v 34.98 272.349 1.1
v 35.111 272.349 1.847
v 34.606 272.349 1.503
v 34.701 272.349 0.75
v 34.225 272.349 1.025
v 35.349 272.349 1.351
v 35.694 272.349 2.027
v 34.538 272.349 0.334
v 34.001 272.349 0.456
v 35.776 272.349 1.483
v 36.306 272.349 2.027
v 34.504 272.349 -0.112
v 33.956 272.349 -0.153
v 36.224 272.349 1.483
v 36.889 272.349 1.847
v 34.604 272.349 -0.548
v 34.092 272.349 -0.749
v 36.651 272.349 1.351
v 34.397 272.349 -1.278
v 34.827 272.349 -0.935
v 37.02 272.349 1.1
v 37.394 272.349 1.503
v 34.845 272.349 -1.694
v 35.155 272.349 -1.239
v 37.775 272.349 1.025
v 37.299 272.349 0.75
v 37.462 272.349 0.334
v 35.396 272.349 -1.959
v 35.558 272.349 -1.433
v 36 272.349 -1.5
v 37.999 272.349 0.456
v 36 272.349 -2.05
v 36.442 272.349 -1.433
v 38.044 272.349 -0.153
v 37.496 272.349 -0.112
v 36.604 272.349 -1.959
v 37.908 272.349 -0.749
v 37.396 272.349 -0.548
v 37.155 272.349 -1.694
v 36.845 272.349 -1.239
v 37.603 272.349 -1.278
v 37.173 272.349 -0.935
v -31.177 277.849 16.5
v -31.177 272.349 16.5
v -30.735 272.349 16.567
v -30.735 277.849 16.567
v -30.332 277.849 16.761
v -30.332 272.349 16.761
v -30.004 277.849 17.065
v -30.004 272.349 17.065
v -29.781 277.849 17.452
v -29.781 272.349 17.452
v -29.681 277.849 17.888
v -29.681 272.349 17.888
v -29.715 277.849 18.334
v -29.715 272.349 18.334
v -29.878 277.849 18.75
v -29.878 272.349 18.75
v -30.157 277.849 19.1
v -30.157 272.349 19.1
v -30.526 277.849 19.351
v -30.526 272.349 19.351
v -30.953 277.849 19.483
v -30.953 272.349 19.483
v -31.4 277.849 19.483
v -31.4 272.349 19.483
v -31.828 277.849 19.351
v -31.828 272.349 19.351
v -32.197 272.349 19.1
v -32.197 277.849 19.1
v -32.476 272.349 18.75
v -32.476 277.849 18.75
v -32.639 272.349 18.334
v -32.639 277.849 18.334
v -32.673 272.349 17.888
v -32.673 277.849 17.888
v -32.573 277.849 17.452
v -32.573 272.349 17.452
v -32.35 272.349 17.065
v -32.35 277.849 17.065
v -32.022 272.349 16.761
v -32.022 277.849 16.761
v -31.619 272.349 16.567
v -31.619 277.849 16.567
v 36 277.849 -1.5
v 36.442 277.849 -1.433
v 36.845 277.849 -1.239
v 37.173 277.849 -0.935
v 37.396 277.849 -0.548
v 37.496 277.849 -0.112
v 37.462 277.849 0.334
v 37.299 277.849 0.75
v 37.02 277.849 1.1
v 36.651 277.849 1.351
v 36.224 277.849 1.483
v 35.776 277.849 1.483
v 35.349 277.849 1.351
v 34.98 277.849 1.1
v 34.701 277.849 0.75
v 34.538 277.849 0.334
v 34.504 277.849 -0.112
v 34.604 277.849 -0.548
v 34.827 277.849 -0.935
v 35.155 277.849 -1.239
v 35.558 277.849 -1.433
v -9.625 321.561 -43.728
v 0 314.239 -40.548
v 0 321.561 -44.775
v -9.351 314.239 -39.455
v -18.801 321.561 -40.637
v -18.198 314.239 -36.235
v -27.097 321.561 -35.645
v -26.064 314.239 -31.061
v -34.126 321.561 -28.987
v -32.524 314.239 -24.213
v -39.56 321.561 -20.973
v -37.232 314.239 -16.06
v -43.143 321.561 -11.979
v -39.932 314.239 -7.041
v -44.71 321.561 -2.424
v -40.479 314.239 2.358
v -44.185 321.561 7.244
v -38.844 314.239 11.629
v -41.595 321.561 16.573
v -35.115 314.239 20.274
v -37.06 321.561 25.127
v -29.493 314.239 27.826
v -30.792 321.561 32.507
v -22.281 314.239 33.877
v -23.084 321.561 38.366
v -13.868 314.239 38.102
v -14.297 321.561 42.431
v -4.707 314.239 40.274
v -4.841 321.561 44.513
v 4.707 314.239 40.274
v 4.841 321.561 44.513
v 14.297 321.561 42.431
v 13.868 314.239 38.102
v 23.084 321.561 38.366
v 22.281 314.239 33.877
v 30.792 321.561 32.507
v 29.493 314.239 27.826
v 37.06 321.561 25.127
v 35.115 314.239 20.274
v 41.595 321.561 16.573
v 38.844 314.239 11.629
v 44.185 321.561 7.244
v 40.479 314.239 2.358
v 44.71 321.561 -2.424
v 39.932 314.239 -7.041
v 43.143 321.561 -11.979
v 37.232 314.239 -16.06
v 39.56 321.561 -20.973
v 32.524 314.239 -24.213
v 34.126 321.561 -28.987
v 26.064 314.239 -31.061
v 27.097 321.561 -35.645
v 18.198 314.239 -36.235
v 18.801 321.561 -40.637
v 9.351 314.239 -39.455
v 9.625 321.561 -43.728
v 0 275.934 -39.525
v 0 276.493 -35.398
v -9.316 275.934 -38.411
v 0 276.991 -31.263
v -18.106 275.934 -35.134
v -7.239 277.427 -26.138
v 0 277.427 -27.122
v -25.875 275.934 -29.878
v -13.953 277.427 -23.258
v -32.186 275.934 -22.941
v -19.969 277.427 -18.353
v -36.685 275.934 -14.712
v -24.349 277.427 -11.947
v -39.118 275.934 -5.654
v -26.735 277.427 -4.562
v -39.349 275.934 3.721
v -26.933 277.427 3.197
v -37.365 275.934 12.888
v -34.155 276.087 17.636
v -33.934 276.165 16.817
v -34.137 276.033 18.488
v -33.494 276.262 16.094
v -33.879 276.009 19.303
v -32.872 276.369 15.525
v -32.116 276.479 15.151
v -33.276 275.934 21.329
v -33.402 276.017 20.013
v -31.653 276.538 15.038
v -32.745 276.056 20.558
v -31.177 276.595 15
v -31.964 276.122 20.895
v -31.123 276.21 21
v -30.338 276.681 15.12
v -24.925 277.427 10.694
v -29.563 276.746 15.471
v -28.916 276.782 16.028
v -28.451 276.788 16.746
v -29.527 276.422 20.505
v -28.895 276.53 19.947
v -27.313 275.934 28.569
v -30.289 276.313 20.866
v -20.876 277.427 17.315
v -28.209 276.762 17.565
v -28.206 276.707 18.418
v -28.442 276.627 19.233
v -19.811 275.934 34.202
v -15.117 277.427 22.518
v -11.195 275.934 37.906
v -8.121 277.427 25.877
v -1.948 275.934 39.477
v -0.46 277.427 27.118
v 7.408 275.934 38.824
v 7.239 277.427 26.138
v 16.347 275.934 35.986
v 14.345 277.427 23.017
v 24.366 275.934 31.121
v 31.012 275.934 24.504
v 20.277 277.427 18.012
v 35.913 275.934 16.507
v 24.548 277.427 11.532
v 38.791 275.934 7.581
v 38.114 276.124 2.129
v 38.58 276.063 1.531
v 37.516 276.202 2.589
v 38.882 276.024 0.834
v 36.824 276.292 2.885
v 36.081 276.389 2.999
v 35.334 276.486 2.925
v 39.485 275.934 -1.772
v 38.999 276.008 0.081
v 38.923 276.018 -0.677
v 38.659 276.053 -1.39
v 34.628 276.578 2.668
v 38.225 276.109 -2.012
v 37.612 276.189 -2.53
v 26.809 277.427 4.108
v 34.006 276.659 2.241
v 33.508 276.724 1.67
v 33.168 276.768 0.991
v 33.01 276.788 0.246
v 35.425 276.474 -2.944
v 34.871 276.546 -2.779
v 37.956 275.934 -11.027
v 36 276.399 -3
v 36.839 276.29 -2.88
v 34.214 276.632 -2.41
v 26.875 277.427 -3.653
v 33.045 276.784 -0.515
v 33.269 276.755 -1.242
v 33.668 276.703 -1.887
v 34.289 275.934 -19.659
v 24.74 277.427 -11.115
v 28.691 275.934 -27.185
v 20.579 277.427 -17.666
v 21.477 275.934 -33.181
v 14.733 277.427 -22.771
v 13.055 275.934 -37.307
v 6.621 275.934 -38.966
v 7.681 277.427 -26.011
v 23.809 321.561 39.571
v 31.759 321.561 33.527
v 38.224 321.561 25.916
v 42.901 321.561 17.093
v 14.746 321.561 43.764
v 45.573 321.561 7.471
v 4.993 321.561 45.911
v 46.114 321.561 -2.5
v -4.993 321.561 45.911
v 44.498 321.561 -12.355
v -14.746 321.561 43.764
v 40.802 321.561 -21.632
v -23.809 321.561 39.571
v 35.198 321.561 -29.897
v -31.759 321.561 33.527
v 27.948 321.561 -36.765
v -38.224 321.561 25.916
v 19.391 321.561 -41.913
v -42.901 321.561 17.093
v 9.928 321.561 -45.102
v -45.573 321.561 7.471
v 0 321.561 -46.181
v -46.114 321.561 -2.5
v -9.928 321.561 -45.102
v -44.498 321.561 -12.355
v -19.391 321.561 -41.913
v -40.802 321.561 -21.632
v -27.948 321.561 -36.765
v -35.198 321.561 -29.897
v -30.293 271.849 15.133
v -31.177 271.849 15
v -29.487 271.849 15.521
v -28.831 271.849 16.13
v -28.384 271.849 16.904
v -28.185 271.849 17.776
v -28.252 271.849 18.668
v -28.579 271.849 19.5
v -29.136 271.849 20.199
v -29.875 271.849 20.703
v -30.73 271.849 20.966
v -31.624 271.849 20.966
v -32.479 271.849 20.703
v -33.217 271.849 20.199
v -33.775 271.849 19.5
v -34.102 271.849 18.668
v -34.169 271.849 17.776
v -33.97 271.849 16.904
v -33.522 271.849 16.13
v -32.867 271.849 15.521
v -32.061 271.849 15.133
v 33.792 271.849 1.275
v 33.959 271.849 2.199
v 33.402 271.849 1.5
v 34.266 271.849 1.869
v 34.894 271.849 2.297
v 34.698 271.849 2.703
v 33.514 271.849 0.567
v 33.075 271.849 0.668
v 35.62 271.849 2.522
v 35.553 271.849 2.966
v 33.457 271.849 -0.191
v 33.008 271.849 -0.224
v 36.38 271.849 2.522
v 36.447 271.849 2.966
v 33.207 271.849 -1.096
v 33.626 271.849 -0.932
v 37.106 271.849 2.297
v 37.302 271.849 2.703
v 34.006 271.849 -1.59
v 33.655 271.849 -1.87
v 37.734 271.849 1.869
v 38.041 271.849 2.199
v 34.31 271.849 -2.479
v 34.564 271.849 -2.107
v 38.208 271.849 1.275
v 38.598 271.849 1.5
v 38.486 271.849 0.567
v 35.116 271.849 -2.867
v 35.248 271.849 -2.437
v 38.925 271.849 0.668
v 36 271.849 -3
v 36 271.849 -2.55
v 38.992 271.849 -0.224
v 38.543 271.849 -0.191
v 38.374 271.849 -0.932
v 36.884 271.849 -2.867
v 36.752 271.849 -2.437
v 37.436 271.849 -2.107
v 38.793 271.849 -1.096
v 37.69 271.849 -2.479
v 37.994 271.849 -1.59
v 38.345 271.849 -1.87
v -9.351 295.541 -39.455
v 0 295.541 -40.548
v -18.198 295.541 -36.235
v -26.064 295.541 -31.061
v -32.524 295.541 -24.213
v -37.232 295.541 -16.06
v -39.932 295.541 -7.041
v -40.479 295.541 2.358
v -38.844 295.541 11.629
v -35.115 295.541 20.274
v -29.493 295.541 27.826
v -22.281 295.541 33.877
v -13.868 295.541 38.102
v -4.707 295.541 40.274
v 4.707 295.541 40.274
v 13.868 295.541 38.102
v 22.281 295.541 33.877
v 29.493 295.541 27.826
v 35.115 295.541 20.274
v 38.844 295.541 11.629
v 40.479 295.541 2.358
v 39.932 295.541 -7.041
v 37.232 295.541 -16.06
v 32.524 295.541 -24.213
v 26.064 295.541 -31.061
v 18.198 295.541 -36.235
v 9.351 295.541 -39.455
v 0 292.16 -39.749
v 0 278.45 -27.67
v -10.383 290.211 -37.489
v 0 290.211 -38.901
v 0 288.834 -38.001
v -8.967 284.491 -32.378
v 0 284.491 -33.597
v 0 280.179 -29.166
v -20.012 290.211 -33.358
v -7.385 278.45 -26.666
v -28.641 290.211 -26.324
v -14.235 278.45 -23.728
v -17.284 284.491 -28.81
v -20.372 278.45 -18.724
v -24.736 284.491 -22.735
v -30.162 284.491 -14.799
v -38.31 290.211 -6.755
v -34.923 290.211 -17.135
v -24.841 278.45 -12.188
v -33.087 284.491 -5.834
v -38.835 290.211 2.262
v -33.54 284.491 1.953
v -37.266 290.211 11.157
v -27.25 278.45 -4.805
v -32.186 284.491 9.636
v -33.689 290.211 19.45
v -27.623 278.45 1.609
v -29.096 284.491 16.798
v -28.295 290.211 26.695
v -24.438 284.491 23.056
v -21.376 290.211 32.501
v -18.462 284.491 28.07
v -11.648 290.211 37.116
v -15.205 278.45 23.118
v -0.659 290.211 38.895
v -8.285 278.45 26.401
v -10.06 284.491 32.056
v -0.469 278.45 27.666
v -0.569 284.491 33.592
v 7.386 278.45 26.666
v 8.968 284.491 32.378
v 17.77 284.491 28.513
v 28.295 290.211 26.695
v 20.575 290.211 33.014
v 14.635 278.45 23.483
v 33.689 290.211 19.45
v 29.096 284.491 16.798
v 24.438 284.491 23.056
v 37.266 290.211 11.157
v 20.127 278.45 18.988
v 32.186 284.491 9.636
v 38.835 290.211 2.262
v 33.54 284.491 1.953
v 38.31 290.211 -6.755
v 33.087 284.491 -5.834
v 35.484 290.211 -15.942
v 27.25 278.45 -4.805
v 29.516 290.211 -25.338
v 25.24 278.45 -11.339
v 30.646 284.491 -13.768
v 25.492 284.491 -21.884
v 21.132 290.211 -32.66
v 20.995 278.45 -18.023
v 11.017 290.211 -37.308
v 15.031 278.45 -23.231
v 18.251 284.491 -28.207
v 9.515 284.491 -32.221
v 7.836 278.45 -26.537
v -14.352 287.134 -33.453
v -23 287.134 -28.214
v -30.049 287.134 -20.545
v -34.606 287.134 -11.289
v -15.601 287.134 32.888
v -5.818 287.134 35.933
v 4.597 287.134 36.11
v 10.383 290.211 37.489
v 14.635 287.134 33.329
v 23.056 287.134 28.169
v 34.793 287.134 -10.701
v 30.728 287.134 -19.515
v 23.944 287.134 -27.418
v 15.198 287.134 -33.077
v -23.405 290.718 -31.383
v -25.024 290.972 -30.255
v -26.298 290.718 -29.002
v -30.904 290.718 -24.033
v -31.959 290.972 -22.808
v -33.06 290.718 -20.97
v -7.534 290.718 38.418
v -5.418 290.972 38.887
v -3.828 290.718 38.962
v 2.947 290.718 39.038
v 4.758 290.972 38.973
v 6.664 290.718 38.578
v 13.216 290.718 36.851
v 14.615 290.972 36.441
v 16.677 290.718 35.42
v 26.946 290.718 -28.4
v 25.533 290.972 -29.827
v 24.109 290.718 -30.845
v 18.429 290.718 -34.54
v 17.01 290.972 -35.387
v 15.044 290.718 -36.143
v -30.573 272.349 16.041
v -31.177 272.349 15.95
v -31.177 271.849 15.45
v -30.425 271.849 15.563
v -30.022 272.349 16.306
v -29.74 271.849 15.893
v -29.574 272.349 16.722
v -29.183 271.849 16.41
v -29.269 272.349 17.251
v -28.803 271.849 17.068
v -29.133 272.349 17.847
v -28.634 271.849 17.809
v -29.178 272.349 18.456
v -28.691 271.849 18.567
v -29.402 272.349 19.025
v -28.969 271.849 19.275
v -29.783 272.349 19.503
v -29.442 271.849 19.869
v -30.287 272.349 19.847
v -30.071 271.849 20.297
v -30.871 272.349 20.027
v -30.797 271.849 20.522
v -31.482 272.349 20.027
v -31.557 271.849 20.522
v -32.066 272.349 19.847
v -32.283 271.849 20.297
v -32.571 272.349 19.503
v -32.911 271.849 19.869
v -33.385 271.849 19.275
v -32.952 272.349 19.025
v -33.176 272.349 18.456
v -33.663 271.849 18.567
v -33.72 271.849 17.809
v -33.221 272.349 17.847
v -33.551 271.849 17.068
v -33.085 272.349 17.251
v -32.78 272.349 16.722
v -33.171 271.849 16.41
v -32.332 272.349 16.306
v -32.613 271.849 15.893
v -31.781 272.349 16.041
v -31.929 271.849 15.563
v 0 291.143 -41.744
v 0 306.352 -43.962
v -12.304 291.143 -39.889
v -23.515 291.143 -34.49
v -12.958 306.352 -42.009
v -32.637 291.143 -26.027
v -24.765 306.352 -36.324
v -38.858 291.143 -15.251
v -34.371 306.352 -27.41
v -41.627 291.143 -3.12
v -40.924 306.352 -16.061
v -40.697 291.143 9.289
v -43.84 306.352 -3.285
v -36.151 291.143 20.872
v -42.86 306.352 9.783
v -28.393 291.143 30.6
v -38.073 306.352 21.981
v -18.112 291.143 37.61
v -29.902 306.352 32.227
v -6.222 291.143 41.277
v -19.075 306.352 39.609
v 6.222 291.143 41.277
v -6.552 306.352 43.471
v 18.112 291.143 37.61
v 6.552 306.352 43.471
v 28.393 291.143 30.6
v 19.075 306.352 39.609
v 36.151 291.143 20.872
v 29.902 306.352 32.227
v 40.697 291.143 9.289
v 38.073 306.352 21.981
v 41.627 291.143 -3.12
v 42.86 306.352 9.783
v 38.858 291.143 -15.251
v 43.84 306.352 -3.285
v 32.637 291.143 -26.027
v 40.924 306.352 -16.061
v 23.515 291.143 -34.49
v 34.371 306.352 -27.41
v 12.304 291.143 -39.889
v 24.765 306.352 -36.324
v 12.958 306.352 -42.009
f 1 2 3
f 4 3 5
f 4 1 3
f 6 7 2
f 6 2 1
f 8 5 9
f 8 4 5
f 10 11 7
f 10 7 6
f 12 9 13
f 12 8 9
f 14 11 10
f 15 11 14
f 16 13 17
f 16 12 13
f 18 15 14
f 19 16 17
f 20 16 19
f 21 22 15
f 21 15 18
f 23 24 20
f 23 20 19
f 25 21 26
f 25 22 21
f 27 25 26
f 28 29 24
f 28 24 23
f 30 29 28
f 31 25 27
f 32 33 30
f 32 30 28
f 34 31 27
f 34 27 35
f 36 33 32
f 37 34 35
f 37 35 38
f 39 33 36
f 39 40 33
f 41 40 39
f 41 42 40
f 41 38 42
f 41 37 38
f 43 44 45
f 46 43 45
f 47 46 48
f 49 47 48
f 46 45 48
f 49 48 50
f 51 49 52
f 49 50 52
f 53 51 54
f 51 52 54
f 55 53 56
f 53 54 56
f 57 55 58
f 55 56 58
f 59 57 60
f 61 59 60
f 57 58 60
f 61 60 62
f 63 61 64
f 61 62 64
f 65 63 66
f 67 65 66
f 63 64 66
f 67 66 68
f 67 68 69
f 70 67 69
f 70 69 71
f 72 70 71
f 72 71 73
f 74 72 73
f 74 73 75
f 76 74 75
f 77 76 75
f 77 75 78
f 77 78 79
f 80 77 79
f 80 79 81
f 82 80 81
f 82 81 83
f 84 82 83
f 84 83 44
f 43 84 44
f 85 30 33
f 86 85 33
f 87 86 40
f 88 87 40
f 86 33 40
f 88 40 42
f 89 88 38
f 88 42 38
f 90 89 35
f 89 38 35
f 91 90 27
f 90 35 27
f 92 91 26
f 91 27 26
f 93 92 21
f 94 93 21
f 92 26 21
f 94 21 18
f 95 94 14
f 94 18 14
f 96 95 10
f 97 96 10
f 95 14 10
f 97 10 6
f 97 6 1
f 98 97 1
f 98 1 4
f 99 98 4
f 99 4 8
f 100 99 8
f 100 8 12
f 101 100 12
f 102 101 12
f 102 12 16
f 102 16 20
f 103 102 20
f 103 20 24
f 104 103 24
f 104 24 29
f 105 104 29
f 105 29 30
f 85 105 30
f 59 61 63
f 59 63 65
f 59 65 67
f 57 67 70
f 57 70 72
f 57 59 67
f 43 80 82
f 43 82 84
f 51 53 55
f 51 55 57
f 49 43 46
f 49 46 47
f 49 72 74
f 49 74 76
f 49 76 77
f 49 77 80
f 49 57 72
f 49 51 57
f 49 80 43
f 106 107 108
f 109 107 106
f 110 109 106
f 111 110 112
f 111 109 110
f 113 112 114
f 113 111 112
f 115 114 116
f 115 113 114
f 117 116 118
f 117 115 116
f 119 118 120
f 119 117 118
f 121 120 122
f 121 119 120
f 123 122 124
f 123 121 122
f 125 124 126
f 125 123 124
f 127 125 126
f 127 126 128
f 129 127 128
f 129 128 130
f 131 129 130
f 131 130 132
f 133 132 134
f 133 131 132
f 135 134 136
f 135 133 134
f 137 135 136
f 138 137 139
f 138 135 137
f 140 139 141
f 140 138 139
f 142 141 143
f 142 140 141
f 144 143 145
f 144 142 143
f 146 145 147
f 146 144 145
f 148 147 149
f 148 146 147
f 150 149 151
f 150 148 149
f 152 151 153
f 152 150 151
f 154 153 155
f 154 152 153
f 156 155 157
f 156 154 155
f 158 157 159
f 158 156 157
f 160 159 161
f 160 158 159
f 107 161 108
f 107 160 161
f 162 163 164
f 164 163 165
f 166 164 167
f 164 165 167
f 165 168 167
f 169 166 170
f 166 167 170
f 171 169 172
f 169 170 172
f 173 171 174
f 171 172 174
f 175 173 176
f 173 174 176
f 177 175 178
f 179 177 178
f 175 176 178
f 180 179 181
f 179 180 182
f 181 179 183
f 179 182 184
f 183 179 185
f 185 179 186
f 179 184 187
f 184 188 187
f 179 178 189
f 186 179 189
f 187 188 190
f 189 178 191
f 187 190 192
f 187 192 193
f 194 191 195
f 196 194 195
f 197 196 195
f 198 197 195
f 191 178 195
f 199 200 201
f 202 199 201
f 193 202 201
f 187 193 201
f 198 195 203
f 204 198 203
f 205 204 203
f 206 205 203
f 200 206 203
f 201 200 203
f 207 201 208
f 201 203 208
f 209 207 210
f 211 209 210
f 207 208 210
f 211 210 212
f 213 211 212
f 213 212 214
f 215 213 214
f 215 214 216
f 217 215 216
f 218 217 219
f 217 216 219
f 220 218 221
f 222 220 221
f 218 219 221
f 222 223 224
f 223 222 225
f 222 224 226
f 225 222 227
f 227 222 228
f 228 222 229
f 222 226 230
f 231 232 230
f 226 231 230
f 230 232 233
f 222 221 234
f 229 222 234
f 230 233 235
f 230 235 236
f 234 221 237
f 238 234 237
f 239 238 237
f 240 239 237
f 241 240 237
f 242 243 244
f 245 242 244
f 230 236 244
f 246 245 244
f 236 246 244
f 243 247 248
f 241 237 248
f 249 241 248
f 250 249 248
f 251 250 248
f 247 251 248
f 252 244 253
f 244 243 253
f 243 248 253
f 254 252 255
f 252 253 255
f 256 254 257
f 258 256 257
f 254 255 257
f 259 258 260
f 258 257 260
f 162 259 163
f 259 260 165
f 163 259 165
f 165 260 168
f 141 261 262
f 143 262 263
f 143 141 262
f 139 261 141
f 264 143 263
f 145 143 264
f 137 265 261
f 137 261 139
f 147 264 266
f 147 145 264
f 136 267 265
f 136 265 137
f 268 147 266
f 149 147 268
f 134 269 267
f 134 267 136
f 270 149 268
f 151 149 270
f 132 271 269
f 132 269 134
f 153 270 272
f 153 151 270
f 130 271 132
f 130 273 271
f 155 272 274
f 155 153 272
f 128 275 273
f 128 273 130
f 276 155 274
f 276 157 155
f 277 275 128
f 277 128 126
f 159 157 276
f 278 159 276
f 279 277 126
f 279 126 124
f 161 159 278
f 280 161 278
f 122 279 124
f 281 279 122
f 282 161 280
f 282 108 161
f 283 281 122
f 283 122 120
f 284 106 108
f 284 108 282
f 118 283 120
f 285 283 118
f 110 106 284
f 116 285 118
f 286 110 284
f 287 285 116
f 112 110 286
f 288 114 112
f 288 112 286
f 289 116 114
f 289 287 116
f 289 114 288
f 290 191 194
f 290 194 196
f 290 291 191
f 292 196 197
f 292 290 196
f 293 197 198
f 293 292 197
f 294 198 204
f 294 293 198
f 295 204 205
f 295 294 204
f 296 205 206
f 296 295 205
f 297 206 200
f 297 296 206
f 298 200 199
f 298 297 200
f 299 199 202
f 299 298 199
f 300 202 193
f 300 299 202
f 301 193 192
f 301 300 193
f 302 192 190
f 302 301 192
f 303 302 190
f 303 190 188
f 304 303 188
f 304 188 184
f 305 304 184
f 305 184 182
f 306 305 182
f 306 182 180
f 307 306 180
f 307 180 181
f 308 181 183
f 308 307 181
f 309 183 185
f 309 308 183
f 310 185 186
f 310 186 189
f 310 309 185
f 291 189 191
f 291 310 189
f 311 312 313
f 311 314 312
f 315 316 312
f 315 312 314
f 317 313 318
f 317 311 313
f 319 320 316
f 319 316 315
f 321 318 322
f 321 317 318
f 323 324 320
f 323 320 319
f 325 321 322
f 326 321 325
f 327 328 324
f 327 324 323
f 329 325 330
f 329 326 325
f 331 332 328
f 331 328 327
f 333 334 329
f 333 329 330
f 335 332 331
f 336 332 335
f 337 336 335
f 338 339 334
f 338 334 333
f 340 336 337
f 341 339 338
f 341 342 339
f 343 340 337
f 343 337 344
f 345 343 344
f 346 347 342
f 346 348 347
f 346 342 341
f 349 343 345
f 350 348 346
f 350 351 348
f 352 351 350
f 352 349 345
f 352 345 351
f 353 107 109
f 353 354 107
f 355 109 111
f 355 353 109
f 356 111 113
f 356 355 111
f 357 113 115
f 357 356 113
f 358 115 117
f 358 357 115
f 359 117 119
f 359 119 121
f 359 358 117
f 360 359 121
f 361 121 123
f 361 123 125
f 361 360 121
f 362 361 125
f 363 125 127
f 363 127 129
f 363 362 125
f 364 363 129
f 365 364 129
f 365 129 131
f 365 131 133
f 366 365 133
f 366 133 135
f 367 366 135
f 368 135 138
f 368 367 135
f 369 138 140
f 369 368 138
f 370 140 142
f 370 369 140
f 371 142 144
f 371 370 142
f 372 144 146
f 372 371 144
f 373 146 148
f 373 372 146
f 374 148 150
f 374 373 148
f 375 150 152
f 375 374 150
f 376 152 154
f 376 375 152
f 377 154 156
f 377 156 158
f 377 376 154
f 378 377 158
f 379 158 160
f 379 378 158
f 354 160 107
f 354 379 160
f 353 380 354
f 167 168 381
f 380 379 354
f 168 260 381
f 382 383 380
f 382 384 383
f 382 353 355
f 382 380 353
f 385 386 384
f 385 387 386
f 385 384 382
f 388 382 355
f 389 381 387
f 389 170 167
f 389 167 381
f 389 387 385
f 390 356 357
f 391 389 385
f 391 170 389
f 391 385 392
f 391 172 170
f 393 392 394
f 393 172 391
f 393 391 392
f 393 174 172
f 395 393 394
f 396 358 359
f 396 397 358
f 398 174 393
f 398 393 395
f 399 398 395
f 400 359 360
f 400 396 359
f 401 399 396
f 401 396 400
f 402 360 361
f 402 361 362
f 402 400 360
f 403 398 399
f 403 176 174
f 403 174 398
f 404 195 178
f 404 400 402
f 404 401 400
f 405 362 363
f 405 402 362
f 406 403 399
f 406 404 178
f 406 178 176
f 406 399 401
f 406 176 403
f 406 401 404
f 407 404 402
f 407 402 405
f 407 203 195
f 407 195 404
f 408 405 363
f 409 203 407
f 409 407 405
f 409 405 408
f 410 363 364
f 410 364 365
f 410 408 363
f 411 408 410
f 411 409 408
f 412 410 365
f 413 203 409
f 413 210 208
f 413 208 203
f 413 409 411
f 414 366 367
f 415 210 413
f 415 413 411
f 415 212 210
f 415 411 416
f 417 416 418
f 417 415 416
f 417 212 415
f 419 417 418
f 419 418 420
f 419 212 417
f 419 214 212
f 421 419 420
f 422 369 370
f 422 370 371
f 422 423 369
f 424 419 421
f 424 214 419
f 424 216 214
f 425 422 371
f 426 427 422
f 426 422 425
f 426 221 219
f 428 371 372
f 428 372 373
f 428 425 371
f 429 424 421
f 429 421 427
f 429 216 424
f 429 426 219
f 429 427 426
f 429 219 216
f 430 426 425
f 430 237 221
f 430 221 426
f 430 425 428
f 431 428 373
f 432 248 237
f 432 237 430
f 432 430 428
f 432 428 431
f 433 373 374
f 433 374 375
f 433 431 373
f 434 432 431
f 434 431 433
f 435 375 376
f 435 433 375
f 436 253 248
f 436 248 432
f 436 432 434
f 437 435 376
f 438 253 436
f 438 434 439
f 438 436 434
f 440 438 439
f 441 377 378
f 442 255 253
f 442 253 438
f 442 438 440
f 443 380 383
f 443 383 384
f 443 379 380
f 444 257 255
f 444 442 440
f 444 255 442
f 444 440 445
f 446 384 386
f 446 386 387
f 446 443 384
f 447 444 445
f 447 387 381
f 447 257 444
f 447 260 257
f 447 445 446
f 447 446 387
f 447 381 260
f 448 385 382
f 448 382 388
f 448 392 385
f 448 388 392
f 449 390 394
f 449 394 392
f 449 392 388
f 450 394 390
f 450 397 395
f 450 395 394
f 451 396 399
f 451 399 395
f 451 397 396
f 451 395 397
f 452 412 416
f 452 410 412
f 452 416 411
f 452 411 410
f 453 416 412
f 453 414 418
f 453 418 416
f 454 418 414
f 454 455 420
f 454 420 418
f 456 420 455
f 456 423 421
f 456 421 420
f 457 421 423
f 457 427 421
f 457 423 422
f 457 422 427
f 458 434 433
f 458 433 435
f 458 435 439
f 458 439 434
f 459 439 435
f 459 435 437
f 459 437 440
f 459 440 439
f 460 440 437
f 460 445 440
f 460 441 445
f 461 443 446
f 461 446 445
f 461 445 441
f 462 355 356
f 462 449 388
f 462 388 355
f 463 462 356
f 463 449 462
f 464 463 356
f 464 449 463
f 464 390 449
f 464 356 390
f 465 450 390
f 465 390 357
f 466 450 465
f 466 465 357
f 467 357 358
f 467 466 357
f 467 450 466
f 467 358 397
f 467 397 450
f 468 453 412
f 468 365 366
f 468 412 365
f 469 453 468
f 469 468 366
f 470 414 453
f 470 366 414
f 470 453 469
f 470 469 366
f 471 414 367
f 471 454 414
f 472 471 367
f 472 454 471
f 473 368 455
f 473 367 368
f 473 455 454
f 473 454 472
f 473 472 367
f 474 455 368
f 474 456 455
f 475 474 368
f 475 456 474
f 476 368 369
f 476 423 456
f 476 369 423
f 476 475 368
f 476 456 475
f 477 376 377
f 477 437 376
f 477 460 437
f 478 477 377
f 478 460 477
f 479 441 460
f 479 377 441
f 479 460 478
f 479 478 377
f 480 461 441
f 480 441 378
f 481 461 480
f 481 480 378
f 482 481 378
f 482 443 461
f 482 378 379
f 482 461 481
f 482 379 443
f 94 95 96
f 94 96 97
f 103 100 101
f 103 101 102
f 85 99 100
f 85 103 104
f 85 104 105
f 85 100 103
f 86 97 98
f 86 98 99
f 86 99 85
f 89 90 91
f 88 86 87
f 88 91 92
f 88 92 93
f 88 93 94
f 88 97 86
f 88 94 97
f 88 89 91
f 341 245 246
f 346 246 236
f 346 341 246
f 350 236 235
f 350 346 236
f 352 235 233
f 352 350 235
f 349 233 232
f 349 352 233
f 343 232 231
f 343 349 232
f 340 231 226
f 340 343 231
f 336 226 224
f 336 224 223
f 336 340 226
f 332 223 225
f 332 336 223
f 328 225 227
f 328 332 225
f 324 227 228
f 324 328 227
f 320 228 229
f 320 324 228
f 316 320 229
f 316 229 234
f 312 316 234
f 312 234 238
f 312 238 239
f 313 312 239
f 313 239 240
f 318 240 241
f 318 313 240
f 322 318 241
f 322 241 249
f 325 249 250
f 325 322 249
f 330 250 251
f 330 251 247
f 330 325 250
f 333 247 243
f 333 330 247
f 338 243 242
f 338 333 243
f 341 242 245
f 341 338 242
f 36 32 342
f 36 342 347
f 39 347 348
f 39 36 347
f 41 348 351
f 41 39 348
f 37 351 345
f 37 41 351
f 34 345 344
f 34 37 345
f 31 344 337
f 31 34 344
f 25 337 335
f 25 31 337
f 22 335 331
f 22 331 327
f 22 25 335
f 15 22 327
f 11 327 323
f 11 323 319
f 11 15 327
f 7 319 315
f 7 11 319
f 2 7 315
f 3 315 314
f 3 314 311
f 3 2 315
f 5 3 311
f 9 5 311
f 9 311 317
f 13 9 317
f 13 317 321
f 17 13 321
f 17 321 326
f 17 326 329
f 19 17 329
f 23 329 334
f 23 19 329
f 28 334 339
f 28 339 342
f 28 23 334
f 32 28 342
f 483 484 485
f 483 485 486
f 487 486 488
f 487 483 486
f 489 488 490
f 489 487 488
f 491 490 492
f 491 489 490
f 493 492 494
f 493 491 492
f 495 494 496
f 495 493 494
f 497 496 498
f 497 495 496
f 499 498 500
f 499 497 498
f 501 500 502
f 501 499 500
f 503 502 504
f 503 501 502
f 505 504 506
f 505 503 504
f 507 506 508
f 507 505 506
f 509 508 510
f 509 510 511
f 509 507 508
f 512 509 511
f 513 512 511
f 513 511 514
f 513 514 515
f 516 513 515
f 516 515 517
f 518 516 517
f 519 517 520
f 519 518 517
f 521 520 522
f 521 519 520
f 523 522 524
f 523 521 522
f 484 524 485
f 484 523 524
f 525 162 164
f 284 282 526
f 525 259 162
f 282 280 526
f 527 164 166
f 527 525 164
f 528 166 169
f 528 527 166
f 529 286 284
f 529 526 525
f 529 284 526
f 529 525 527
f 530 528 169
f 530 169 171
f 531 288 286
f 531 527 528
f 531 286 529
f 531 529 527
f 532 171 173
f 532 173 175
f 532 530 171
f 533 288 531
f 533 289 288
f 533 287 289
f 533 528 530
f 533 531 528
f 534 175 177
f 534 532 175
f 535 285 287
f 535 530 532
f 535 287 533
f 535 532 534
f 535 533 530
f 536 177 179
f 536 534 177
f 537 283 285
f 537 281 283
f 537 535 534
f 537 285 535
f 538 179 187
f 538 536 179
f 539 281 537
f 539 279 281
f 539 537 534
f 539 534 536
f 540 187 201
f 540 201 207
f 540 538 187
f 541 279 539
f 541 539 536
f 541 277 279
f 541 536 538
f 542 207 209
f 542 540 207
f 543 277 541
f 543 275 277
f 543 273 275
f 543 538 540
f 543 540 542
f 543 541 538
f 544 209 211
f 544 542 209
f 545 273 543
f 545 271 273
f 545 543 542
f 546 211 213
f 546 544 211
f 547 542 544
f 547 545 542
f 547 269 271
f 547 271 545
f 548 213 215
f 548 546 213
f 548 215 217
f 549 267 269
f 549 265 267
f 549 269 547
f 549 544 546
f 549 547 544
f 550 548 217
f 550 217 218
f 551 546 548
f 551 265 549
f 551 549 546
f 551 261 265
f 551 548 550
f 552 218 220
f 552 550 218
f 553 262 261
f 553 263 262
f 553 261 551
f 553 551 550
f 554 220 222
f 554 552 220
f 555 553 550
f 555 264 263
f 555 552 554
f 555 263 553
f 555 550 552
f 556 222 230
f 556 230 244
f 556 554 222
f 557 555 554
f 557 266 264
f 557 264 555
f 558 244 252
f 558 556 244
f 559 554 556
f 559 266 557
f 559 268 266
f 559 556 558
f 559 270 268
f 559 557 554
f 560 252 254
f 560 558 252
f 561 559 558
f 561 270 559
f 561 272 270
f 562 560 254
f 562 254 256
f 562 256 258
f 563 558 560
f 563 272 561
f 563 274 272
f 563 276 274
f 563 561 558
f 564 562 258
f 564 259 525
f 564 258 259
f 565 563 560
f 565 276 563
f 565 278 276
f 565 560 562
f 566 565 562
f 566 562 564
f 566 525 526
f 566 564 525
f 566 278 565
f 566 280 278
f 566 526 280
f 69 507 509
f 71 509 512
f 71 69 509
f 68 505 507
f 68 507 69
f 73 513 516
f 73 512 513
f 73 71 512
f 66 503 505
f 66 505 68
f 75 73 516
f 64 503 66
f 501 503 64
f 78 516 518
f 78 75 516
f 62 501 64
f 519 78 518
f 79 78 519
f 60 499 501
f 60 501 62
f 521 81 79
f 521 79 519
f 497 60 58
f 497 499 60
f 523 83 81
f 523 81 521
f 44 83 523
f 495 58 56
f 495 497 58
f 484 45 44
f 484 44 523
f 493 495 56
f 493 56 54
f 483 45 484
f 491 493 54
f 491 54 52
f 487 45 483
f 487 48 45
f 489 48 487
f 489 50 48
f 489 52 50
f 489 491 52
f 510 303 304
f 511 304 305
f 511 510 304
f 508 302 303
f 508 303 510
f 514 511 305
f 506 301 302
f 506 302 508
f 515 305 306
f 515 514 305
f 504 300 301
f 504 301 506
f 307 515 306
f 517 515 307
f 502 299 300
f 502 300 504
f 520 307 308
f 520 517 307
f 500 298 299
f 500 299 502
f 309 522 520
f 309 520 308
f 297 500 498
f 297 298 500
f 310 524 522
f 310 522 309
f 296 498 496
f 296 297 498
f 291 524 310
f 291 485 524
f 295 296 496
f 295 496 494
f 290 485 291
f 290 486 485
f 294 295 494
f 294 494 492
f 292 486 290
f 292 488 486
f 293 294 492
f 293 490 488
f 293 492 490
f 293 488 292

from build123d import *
from OCP.BRepAlgoAPI import BRepAlgoAPI_Cut
from OCP.TopTools import TopTools_ListOfShape

# Parameters (mm, degrees)
SKETCH4_R                       = 3
BOSS_EXTRUDE1_DEPTH             = 2
SKETCH4_2_R                     = 3
BOSS_EXTRUDE3_DEPTH             = 2
BOSS_EXTRUDE3_DIRECTION_2_REACH = 82.882
SKETCH13_R                      = 1.5
CUT_EXTRUDE1_DEPTH              = 6
SKETCH14_R                      = 2
CUT_EXTRUDE2_DEPTH              = 0.5
CHAMFER3_SIZE                   = 0.55


with BuildPart() as part:
    # Sketch2 → Revolve6 (revolve)
    with BuildSketch(Plane(origin=(0, 0, 0), x_dir=(0, 0, -1), z_dir=(1, 0, 0))):
        with BuildLine():
            Line((26.5077562, 274.996982717), (26.5077562, 273.848618937))
            Line((26.5077562, 273.848618937), (39.220771912, 273.848618937))
            Line((39.220771912, 273.848618937), (46.181267187, 321.561079724))
            Line((46.181267187, 321.561079724), (44.775299462, 321.561079724))
            Line((44.775299462, 321.561079724), (40.547674755, 314.238618937))
            Line((40.547674755, 314.238618937), (40.547674755, 295.540718438))
            add(Edge.make_bspline(
                [(40.547674755, 295.540718438), (40.447740466, 295.012709616), (40.292777353, 293.970757619), (39.930889755, 292.587532753), (39.516186416, 291.581451359), (39.108370782, 290.57804728), (38.439698054, 289.316986818), (37.331416086, 288.032583079), (36.368363881, 287.115418474), (35.630231264, 286.340079673), (35.016472726, 285.762737126), (34.394259795, 285.247169223), (33.635524662, 284.556557999), (32.920361334, 283.771384038), (32.129651901, 282.986073936), (31.485241784, 282.459482323), (30.914997208, 281.963476573), (30.371700346, 281.391298159), (29.782796159, 280.80462685), (29.227584581, 280.262154528), (28.724752618, 279.674853681), (28.180386253, 279.039651715), (27.651838315, 278.470209992), (27.308145935, 277.876839187), (26.995230081, 277.127164256), (26.597952618, 276.164510632), (26.464811583, 275.470548141), (26.5077562, 274.996982717)],
                knots=[0, 0, 0, 0, 0.062544048, 0.125088096, 0.156360121, 0.187632145, 0.250176193, 0.312720241, 0.375264289, 0.406536313, 0.437808337, 0.469080362, 0.500352386, 0.562896434, 0.594168458, 0.625440482, 0.656712506, 0.68798453, 0.719256554, 0.750528579, 0.781800603, 0.813072627, 0.844344651, 0.875616675, 0.906888699, 0.938160723, 1.000704771, 1.000704771, 1.000704771, 1.000704771], degree=3))
        make_face()
    revolve(axis=Axis((0, 5, 0), (0, 1, 0)))

    # Sketch4 → Boss-Extrude1 (add)
    with BuildSketch(Plane.XZ.offset(-273.848618937)):
        with Locations(Location((-31.176914536, 18, 0), (0, 0, 270))):
            Circle(SKETCH4_R)
        with Locations(Location((36, 0, 0), (0, 0, 270))):
            Circle(SKETCH4_R)
    extrude(amount=BOSS_EXTRUDE1_DEPTH)

    # Sketch7 → Revolve7 (revolve)
    with BuildSketch(Plane(origin=(0, 0, 0), x_dir=(0, 0, -1), z_dir=(1, 0, 0))):
        with BuildLine():
            Line((39.220771912, 273.848618937), (39.220771912, 272.319355593))
            ThreePointArc((39.220771912, 272.319355593), (32.873157949, 273.157923648), (26.5077562, 273.848618937))
            Line((26.5077562, 273.848618937), (26.5077562, 274.348618937))
            Line((26.5077562, 274.348618937), (39.220771912, 274.348618937))
            Line((39.220771912, 274.348618937), (39.220771912, 273.848618937))
        make_face()
    revolve(axis=Axis((0, 5, 0), (0, 1, 0)))


with BuildPart() as cut_revolve3_tool:
    # Sketch12 → Cut-Revolve3 (revolve)
    with BuildSketch(Plane(origin=(0, 0, 0), x_dir=(0, 0, -1), z_dir=(1, 0, 0))):
        with BuildLine():
            Line((26.0877562, 277.526559948), (26.0877562, 267.526559948))
            Line((26.0877562, 267.526559948), (40.0877562, 267.526559948))
            Line((40.0877562, 267.526559948), (40.0877562, 275.852377736))
            ThreePointArc((40.0877562, 275.852377736), (33.098343341, 276.778001597), (26.0877562, 277.526559948))
        make_face()
    revolve(axis=Axis((0, 5, 0), (0, 1, 0)))


with BuildPart() as part_1:
    add(part.part)

    # Cut-Revolve3: cut by cut_revolve3_tool, with a tolerance
    cut_revolve3_stock = TopTools_ListOfShape()
    cut_revolve3_stock.Append(part_1.part.wrapped)
    cut_revolve3_tools = TopTools_ListOfShape()
    cut_revolve3_tools.Append(cut_revolve3_tool.part.wrapped)
    cut_revolve3_cut = BRepAlgoAPI_Cut()
    cut_revolve3_cut.SetArguments(cut_revolve3_stock)
    cut_revolve3_cut.SetTools(cut_revolve3_tools)
    cut_revolve3_cut.SetFuzzyValue(0.00001)
    cut_revolve3_cut.Build()
    add(Compound.cast(cut_revolve3_cut.Shape()).solids(), mode=Mode.REPLACE)

    # Sketch4<2> → Boss-Extrude3 (add)
    with BuildSketch(Plane.XZ.offset(-273.848618937)):
        with Locations(Location((-31.176914536, 18, 0), (0, 0, 270))):
            Circle(SKETCH4_2_R)
        with Locations(Location((36, 0, 0), (0, 0, 270))):
            Circle(SKETCH4_2_R)
    extrude(amount=BOSS_EXTRUDE3_DEPTH)

    # Sketch4<2> → Boss-Extrude3 direction 2 (add, up to next)
    with BuildSketch(Plane.XZ.offset(-273.848618937), mode=Mode.PRIVATE) as boss_extrude3_direction_2_sk1:
        with Locations(Location((-31.176914536, 18, 0), (0, 0, 270))):
            Circle(SKETCH4_2_R)
    boss_extrude3_direction_2_tool1 = extrude(boss_extrude3_direction_2_sk1.sketch, amount=-BOSS_EXTRUDE3_DIRECTION_2_REACH, mode=Mode.PRIVATE) - part_1.part
    # Sketch4<2> → Boss-Extrude3 direction 2 (add, up to next)
    with BuildSketch(Plane.XZ.offset(-273.848618937), mode=Mode.PRIVATE) as boss_extrude3_direction_2_sk2:
        with Locations(Location((36, 0, 0), (0, 0, 270))):
            Circle(SKETCH4_2_R)
    boss_extrude3_direction_2_tool2 = extrude(boss_extrude3_direction_2_sk2.sketch, amount=-BOSS_EXTRUDE3_DIRECTION_2_REACH, mode=Mode.PRIVATE) - part_1.part
    add(boss_extrude3_direction_2_tool1.solids().sort_by_distance((-31.176915, 273.848619, 18))[0])
    add(boss_extrude3_direction_2_tool2.solids().sort_by_distance((36, 273.848619, 0))[0])

    # Sketch13 → Cut-Extrude1 (cut)
    with BuildSketch(Plane.XZ.offset(-271.848618937)):
        with Locations(Location((-31.176914536, 18, 0), (0, 0, 270))):
            Circle(SKETCH13_R)
        with Locations(Location((36, 0, 0), (0, 0, 270))):
            Circle(SKETCH13_R)
    extrude(amount=-CUT_EXTRUDE1_DEPTH, mode=Mode.SUBTRACT)

    # Sketch14 → Cut-Extrude2 (cut)
    with BuildSketch(Plane.XZ.offset(-271.848618937)):
        with Locations(Location((-31.176914536, 18, 0), (0, 0, 270))):
            Circle(SKETCH14_R)
        with Locations(Location((36, 0, 0), (0, 0, 270))):
            Circle(SKETCH14_R)
    extrude(amount=-CUT_EXTRUDE2_DEPTH, mode=Mode.SUBTRACT)

    # Chamfer3
    # the kernel refuses this chamfer: 0.55 mm, written as the material it takes off along each edge
    with BuildSketch(Plane(origin=(36, 271.848618937, 0), x_dir=(0, 0, -1), z_dir=(-1, 0, 0))) as chamfer3_piece_1_section:
        Polygon((2 + CHAMFER3_SIZE, 0), (2, -CHAMFER3_SIZE), (2, 0), align=None)
    chamfer3_piece_1 = revolve(axis=Axis((36, 271.848618937, 0), (0, -1, 0)), mode=Mode.PRIVATE)
    chamfer3_piece_1 = split(chamfer3_piece_1, bisect_by=Plane(origin=(36, 272.348618937, 0), z_dir=(0, -1, 0)), keep=Keep.TOP, mode=Mode.PRIVATE)
    add(chamfer3_piece_1, mode=Mode.SUBTRACT)
    with BuildSketch(Plane(origin=(-31.176914536, 271.848618937, 18), x_dir=(0, 0, -1), z_dir=(-1, 0, 0))) as chamfer3_piece_2_section:
        Polygon((2 + CHAMFER3_SIZE, 0), (2, -CHAMFER3_SIZE), (2, 0), align=None)
    chamfer3_piece_2 = revolve(axis=Axis((-31.176914536, 271.848618937, 18), (0, -1, 0)), mode=Mode.PRIVATE)
    chamfer3_piece_2 = split(chamfer3_piece_2, bisect_by=Plane(origin=(-31.176914536, 272.348618937, 18), z_dir=(0, -1, 0)), keep=Keep.TOP, mode=Mode.PRIVATE)
    add(chamfer3_piece_2, mode=Mode.SUBTRACT)


solid = part_1.part
